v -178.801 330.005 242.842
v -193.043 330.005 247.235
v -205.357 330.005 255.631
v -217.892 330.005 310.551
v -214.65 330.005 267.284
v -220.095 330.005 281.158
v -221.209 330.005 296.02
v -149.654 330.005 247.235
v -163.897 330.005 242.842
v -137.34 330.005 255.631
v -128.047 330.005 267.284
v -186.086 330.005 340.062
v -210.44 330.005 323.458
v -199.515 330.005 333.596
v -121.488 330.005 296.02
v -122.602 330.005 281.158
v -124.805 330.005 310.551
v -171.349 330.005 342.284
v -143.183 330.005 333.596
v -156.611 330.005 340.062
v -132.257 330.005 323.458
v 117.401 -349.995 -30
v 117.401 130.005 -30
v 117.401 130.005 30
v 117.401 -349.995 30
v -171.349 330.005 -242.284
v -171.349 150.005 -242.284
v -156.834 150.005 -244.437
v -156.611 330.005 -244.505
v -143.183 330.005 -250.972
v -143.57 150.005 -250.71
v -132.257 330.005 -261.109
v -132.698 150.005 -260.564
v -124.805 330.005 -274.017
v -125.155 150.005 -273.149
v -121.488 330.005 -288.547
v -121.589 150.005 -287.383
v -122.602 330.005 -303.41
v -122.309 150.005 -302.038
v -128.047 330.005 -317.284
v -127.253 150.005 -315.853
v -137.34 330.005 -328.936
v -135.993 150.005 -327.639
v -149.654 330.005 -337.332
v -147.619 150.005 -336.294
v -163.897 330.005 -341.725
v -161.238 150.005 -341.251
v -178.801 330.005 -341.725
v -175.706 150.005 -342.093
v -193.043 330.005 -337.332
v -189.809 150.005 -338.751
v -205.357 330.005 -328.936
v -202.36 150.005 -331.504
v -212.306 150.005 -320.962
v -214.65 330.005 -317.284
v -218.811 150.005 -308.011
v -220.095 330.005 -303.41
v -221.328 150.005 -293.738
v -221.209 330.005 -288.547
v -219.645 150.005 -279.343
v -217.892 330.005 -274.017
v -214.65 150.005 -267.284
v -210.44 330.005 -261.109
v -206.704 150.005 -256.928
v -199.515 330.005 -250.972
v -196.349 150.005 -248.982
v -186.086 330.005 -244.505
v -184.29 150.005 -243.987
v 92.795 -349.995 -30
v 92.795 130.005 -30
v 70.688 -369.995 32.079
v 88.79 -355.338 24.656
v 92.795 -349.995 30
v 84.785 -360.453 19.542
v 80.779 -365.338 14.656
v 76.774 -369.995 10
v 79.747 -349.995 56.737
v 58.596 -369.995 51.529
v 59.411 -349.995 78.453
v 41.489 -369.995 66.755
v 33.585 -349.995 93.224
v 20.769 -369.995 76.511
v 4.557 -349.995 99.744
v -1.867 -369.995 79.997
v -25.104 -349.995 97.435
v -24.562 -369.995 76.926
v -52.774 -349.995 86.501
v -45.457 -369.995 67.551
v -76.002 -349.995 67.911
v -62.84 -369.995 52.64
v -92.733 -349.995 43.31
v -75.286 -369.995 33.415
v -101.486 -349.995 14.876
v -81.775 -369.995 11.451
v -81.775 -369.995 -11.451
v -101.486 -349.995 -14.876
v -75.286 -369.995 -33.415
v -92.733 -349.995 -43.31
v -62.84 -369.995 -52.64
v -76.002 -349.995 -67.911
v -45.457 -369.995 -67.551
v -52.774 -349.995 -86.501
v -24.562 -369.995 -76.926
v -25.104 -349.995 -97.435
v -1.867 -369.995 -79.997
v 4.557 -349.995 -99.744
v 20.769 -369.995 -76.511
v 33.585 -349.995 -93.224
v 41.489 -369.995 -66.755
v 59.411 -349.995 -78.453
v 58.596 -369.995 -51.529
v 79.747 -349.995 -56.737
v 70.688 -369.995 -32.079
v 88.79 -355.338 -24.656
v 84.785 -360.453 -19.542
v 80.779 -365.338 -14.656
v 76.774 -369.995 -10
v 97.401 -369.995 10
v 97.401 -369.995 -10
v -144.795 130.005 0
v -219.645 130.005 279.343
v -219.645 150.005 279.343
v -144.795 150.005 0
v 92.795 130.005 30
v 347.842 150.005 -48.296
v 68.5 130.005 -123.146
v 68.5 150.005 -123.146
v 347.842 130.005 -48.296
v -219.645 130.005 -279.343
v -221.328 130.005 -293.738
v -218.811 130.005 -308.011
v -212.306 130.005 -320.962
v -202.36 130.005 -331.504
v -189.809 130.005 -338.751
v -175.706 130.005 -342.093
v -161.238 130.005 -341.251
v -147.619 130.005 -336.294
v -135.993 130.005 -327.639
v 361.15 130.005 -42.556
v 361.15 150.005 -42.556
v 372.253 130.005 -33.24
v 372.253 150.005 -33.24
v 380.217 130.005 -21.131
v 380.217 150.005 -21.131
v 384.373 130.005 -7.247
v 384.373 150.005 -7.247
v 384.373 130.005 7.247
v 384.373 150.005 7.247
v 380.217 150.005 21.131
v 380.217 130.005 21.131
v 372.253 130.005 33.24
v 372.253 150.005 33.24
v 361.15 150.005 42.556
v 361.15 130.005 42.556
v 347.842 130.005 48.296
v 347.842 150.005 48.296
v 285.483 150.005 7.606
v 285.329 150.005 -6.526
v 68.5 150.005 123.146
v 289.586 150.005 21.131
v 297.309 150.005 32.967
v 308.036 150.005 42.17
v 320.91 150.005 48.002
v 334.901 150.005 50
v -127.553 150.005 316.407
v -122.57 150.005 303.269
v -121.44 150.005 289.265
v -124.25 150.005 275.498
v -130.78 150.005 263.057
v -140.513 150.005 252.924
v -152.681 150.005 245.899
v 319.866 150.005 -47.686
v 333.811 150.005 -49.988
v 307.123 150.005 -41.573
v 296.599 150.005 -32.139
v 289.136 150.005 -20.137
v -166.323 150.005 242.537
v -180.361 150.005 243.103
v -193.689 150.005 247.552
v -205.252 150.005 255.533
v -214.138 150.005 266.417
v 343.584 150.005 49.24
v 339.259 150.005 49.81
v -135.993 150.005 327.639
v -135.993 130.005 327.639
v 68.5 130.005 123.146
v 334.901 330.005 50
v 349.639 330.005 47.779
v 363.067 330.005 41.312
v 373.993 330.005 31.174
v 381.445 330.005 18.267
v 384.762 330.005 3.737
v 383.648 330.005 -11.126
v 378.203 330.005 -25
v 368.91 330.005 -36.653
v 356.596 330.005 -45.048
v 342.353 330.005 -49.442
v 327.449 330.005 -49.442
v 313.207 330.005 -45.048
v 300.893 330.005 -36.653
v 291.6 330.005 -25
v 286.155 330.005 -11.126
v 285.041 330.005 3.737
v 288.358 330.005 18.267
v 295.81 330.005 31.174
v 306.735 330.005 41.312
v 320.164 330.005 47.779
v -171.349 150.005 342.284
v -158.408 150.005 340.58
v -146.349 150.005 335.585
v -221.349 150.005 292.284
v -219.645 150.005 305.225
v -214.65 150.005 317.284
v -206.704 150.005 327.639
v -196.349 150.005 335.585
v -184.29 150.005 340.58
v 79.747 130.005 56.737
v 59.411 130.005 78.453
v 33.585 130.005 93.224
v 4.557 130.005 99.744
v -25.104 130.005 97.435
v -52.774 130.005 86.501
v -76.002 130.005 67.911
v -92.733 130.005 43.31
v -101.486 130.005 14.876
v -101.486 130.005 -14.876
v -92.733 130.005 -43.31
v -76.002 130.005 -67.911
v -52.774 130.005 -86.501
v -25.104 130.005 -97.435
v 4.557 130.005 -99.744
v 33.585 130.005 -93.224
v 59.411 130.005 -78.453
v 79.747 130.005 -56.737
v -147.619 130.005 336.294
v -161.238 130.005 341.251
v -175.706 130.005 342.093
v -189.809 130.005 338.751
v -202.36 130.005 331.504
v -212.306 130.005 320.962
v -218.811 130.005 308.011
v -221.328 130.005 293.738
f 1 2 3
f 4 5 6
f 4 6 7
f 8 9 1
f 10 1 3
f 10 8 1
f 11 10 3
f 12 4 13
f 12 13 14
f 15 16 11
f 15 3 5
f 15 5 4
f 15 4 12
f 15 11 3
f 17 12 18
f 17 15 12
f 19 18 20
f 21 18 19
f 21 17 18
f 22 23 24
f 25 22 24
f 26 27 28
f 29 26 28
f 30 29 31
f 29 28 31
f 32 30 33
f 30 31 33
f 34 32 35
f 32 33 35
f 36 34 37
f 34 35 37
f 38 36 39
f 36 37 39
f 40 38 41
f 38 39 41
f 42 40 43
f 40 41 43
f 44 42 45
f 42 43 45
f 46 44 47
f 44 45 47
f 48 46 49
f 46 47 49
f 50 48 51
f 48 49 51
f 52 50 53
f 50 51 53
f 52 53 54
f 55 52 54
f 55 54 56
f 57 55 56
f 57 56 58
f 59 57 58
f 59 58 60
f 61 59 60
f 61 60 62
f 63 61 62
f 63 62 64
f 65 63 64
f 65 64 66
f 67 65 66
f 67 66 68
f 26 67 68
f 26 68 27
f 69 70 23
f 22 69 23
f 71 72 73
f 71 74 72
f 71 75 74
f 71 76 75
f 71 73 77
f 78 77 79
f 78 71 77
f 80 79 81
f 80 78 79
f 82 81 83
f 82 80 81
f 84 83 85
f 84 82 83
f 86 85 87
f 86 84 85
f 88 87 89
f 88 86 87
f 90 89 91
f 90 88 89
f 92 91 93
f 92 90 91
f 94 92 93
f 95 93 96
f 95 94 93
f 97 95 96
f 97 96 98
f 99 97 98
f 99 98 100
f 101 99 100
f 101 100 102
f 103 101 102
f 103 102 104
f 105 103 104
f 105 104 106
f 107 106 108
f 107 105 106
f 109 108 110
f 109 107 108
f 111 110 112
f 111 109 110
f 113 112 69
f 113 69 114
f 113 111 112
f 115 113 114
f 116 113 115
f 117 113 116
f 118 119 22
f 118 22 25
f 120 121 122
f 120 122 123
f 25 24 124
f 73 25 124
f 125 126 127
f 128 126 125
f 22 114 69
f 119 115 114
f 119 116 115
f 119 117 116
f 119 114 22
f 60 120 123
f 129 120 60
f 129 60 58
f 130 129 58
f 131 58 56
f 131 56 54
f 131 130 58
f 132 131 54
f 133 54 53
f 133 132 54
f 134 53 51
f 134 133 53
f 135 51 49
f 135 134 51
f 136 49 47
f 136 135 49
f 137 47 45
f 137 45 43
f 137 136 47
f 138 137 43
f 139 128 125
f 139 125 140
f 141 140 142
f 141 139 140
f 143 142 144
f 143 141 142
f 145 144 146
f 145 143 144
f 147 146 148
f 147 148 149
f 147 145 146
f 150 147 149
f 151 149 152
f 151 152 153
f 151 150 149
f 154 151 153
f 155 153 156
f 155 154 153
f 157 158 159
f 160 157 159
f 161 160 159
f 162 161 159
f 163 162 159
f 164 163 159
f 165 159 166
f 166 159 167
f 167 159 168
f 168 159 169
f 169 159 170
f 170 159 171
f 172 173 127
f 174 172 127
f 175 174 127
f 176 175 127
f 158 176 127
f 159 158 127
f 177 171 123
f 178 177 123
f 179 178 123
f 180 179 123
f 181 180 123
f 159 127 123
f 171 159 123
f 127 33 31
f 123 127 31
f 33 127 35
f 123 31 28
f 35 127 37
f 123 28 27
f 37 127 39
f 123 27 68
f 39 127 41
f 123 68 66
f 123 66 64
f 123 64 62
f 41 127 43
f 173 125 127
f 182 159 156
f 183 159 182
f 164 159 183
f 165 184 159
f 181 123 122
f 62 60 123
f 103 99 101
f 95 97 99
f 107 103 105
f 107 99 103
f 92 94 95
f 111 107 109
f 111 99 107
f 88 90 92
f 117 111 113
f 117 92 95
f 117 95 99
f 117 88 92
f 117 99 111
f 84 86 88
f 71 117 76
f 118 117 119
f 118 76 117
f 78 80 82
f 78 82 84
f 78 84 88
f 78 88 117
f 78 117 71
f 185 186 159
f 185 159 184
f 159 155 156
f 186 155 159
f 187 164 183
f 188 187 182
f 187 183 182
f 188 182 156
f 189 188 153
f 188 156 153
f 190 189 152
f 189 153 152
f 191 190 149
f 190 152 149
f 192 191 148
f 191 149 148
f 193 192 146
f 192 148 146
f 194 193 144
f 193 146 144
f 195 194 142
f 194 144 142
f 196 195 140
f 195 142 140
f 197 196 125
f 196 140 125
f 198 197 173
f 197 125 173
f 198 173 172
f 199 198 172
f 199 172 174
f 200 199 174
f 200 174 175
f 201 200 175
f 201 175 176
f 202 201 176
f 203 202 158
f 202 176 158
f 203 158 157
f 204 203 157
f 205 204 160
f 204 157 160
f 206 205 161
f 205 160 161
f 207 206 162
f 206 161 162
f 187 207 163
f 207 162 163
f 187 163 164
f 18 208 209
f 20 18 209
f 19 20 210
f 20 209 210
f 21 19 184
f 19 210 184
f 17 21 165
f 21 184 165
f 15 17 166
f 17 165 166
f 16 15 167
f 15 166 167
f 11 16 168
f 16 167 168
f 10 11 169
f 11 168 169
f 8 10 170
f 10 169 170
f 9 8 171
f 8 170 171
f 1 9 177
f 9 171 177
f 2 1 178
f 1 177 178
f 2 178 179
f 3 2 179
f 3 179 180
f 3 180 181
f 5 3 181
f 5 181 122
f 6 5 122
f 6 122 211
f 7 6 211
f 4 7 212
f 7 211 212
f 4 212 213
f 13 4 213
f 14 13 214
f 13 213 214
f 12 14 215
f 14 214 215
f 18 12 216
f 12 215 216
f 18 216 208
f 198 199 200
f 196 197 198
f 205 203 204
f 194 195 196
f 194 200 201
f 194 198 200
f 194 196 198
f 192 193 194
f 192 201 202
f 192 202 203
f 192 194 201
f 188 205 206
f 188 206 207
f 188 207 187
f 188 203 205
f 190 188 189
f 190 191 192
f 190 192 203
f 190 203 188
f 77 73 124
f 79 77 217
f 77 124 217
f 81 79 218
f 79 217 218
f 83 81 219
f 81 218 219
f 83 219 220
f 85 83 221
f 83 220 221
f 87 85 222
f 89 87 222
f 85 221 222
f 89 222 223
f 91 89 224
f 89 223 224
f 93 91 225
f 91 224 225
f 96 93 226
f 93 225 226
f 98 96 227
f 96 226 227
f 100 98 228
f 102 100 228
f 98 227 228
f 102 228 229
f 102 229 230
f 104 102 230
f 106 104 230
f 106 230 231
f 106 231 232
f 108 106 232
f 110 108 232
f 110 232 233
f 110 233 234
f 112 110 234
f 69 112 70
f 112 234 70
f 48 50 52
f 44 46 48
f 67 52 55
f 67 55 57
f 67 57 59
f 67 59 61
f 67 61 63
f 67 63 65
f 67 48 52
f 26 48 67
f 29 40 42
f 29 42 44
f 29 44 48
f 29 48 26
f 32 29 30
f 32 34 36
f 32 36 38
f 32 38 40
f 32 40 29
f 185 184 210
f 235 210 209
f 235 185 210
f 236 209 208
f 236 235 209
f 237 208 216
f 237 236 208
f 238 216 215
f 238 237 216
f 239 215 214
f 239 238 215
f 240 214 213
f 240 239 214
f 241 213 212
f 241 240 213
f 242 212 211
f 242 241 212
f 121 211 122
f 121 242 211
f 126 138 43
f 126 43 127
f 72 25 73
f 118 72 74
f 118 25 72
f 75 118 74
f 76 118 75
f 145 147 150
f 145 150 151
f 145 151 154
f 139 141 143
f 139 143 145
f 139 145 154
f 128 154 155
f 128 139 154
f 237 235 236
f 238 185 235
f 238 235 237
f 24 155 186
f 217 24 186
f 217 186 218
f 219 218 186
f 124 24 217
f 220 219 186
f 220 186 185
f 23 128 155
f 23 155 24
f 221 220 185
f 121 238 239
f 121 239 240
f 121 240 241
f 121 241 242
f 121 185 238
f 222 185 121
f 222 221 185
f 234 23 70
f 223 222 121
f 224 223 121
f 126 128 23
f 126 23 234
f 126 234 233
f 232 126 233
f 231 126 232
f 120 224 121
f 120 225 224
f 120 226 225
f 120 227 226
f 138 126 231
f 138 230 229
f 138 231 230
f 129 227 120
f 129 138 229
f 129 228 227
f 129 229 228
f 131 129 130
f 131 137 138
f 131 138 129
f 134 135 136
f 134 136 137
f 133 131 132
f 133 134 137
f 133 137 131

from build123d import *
from build123d.topology import SkipClean

# Parameters (mm, degrees)
SKETCH2_R             = 5
BOSS_EXTRUDE2_DEPTH   = 18
BOSS_EXTRUDE2_2_DEPTH = 18
BOSS_EXTRUDE2_3_DEPTH = 18
BOSS_EXTRUDE3_START   = -2
BOSS_EXTRUDE3_DEPTH   = 2
BOSS_EXTRUDE4_DEPTH   = 50
CHAMFER5_SIZE         = 2
SCALE1_SCALE          = 10


with BuildPart() as part:
    # Sketch2 → Boss-Extrude2 (new body)
    with BuildSketch(Plane(origin=(0, 0, 0), x_dir=(1, 0, 0), z_dir=(0, 1, 0))):
        with Locations((33.75, 0)):
            Circle(SKETCH2_R)
    extrude(amount=BOSS_EXTRUDE2_DEPTH)



with BuildPart() as body_2:
    # Sketch2 → Boss-Extrude2 2 (new body)
    with BuildSketch(Plane(origin=(0, 0, 0), x_dir=(1, 0, 0), z_dir=(0, 1, 0))):
        with Locations((-16.875, -29.228357378)):
            Circle(SKETCH2_R)
    extrude(amount=BOSS_EXTRUDE2_2_DEPTH)


with BuildPart() as body_3:
    # Sketch2 → Boss-Extrude2 3 (new body)
    with BuildSketch(Plane(origin=(0, 0, 0), x_dir=(1, 0, 0), z_dir=(0, 1, 0))):
        with Locations((-16.875, 29.228357378)):
            Circle(SKETCH2_R)
    extrude(amount=BOSS_EXTRUDE2_3_DEPTH)


with BuildPart() as part_1:
    with SkipClean():  # the faces are left unmerged after this step: merging them gives an invalid solid
        add(part.part)

        add(body_2.part)  # Boss-Extrude3 merges body 2

        add(body_3.part)  # Boss-Extrude3 merges body 3
        # Sketch5 → Boss-Extrude3 (add)
        with BuildSketch(Plane(origin=(0, 0, 0), x_dir=(1, 0, 0), z_dir=(0, 1, 0)).offset(BOSS_EXTRUDE3_START)):
            with BuildLine():
                Line((-13.339466094, 32.763891284), (7.109833073, 12.314592116))
                Line((7.109833073, 12.314592116), (35.044095226, 4.829629131))
                ThreePointArc((35.044095226, 4.829629131), (38.75, 0), (35.044095226, -4.829629131))
                Line((35.044095226, -4.829629131), (7.109833073, -12.314592116))
                Line((7.109833073, -12.314592116), (-13.339466094, -32.763891284))
                ThreePointArc((-13.339466094, -32.763891284), (-19.375, -33.558484397), (-21.704629131, -27.934262152))
                Line((-21.704629131, -27.934262152), (-14.219666147, 0))
                Line((-14.219666147, 0), (-21.704629131, 27.934262152))
                ThreePointArc((-21.704629131, 27.934262152), (-19.375, 33.558484397), (-13.339466094, 32.763891284))
            make_face()
        extrude(amount=BOSS_EXTRUDE3_DEPTH)

    # Sketch6 → Boss-Extrude4 (add)
    with SkipClean():  # the faces are left unmerged after this step: merging them gives an invalid solid
        with BuildSketch(Plane.XZ.offset(2)):
            with BuildLine():
                Line((9.539392014, -3), (12, -3))
                Line((12, -3), (12, 3))
                Line((12, 3), (9.539392014, 3))
                ThreePointArc((9.539392014, 3), (-10, 0), (9.539392014, -3))
            make_face()
        extrude(amount=BOSS_EXTRUDE4_DEPTH)

    # Chamfer5
    chamfer5_edges = [part_1.edges().sort_by_distance(p)[0] for p in [
        (10.769696007, -52, 3),
        (12, -52, 0),
        (10.769696007, -52, -3),
        (-10, -52, 0),
    ]]
    chamfer(chamfer5_edges, length=CHAMFER5_SIZE)


with BuildPart() as part_2:
    # Scale1: scaled about (0.288742854, -16.667261458, 0)
    add(part_1.part.scale(SCALE1_SCALE).moved(Location((-2.598685686, 150.005353122, 0))))


solid = part_2.part
